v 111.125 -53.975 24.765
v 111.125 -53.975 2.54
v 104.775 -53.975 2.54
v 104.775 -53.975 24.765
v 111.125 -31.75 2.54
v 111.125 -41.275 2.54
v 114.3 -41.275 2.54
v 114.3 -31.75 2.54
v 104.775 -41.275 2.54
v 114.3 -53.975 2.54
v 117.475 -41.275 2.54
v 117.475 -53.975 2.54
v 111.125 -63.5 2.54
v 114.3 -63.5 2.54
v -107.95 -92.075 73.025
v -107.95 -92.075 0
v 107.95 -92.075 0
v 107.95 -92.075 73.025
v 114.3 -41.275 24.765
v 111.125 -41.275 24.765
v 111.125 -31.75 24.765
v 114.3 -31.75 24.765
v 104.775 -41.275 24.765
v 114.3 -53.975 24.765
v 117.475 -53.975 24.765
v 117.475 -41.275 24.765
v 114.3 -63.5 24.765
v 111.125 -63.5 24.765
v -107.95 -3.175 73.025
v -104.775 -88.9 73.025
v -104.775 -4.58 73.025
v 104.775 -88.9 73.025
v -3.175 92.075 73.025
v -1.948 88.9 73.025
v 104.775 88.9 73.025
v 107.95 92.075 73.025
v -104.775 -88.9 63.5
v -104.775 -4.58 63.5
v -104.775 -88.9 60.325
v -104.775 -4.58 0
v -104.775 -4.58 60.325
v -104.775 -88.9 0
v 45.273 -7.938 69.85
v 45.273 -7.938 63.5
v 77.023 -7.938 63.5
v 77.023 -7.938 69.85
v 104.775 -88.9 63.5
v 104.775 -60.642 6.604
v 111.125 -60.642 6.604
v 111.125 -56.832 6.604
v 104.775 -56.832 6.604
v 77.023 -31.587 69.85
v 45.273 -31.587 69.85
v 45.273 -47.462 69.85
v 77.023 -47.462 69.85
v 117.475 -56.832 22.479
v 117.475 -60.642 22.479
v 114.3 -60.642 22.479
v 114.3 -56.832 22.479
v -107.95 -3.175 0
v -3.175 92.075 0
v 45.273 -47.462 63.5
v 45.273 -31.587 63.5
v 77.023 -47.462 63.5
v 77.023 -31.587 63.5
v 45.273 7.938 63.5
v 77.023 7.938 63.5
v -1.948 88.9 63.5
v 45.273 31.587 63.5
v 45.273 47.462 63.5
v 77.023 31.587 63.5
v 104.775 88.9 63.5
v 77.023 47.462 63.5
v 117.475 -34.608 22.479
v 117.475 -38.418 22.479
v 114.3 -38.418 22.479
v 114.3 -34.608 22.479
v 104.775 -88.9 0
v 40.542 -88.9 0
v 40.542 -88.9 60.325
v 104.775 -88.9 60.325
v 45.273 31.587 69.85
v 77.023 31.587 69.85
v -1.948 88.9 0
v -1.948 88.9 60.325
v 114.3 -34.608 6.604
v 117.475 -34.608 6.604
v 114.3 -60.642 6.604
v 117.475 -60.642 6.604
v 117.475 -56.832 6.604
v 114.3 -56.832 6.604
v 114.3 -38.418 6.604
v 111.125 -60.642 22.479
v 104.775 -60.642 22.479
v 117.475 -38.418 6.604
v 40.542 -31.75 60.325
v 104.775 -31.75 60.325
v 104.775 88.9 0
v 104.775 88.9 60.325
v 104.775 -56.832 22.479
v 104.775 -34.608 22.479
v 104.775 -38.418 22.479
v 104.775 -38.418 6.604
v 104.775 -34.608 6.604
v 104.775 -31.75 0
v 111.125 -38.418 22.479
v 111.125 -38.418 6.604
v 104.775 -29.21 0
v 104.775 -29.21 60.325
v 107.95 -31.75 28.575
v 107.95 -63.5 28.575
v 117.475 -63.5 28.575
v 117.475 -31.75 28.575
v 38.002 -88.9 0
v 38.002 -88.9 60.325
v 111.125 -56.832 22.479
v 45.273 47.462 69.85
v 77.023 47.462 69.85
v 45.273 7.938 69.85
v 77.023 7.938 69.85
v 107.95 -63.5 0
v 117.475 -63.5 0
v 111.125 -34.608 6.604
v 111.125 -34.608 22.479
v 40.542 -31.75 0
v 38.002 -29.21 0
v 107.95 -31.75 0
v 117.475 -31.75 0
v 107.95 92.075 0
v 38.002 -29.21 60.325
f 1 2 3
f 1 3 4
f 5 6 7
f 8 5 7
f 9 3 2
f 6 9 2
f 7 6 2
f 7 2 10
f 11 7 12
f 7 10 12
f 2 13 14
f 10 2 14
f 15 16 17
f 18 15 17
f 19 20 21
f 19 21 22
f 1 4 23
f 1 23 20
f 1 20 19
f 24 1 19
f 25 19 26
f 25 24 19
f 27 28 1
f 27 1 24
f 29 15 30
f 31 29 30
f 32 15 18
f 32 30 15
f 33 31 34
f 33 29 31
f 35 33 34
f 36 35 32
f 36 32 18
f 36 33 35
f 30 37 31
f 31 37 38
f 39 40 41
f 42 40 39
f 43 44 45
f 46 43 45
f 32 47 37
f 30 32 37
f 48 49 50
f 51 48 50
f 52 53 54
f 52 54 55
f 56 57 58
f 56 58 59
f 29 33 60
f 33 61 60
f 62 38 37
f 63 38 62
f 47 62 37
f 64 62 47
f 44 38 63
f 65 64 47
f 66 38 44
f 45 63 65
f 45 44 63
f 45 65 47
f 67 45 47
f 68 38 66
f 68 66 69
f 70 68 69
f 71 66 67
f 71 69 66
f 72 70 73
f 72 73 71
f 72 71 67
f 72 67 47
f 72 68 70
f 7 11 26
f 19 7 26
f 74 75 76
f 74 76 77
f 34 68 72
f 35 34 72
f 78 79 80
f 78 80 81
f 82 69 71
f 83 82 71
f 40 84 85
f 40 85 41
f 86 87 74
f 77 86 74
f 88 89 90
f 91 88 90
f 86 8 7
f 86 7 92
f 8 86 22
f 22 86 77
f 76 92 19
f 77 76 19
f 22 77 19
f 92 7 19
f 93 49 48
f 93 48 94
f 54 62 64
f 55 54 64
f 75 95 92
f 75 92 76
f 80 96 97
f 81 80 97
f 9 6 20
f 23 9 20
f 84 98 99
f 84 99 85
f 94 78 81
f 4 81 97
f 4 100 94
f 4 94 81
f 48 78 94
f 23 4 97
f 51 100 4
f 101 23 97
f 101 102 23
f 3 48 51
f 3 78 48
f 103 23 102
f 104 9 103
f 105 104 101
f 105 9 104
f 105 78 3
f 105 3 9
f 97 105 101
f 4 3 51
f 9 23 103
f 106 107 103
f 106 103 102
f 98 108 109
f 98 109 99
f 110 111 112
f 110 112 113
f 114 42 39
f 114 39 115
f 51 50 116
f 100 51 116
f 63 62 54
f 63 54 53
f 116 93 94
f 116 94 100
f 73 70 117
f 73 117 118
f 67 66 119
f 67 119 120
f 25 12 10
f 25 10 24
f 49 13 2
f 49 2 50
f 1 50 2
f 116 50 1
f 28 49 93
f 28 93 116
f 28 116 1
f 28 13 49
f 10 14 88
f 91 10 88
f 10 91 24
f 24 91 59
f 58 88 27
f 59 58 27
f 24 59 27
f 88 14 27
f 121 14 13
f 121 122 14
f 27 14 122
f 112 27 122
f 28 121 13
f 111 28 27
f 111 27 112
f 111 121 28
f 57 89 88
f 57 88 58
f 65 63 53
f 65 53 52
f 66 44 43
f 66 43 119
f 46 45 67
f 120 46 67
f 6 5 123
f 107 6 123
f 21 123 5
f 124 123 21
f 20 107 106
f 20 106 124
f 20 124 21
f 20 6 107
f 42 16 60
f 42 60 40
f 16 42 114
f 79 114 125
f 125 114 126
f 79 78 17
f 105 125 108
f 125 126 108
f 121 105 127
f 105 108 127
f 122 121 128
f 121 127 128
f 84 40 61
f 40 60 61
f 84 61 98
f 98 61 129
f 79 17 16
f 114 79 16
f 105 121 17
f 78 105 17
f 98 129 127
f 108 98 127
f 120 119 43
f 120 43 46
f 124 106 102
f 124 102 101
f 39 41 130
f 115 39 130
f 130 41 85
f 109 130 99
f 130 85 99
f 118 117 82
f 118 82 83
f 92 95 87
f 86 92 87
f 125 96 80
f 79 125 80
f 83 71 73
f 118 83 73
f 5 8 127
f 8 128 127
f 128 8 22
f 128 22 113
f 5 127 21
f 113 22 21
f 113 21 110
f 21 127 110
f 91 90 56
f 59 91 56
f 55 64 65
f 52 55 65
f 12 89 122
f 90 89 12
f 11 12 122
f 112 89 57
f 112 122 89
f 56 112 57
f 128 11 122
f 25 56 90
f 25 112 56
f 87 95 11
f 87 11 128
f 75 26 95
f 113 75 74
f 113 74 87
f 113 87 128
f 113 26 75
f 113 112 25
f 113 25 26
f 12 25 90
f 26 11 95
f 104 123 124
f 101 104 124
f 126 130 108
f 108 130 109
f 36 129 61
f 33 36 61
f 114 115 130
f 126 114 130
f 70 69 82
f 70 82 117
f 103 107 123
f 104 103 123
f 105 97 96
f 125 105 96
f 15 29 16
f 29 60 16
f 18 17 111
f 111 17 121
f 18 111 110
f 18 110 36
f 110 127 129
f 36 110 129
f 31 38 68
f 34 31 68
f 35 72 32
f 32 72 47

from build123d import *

# Parameters (mm, degrees)
F1_DEPTH  = 63.5
F2_T      = -3.175
F4_DEPTH  = 9.525
F5_W      = 31.75
F5_H      = 15.875
F6_DEPTH  = 6.35
F8_DEPTH  = 60.325
F9_W      = 31.75
F9_H      = 28.575
F10_DEPTH = 9.525
F11_W     = 12.7
F11_H     = 22.225
F11_W_2   = 3.81
F11_H_2   = 15.875
F12_DEPTH = 25.654
F13_W     = 3.175
F13_H     = 22.225
F14_DEPTH = 127


with BuildPart() as f1:
    # F0 (on Top) → F1 (new body)
    with BuildSketch(Plane.XY):
        Polygon((107.95, 92.075), (-3.175, 92.075), (-107.95, -3.175), (-107.95, -92.075), (107.95, -92.075), align=None)
    extrude(amount=F1_DEPTH)

    # F2
    f2_openings = [f1.faces().sort_by_distance(p)[0] for p in [
        (10.480538, -8.657836, 0),
    ]]
    offset(amount=F2_T, openings=f2_openings)

    # F3 (on face) → F4 (join)
    with BuildSketch(Plane.XY.offset(63.5)):
        Polygon((107.95, 92.075), (-3.175, 92.075), (-107.95, -3.175), (-107.95, -92.075), (107.95, -92.075), align=None)
        Polygon((104.775, -88.9), (-104.775, -88.9), (-104.775, -4.579524), (-1.947523, 88.9), (104.775, 88.9), align=None, mode=Mode.SUBTRACT)
    extrude(amount=F4_DEPTH)

    # F5 (on face) → F6 (join)
    with BuildSketch(Plane.XY.offset(63.5)):
        with Locations((61.147683, 39.524323)):
            Rectangle(F5_W, F5_H)
        with Locations((61.147683, 0)):
            Rectangle(F5_W, F5_H)
        with Locations((61.147683, -39.524323)):
            Rectangle(F5_W, F5_H)
    extrude(amount=F6_DEPTH)

    # F7 (on face) → F8 (join, through all)
    with BuildSketch(Plane(origin=(0, 0, 60.325), x_dir=(1, 0, 0), z_dir=(0, 0, -1))):
        Polygon((104.775, 29.21), (104.775, 31.75), (40.541738, 31.75), (40.541738, 88.9), (38.001738, 88.9), (38.001738, 29.21), align=None)
    extrude(amount=F8_DEPTH)

    # F9 (on face) → F10 (join)
    with BuildSketch(Plane.YZ.offset(107.95)):
        with Locations((-47.625, 14.2875)):
            Rectangle(F9_W, F9_H)
    extrude(amount=F10_DEPTH)

    # F11 (on face) → F12 (cut)
    with BuildSketch(Plane.YZ.offset(117.475)):
        with Locations((-47.625, 13.6525)):
            Rectangle(F11_W, F11_H)
        with Locations((-58.7375, 14.5415)):
            Rectangle(F11_W_2, F11_H_2)
        with Locations((-36.5125, 14.5415)):
            Rectangle(F11_W_2, F11_H_2)
    extrude(amount=-F12_DEPTH, mode=Mode.SUBTRACT)

    # F13 (on face) → F14 (cut)
    with BuildSketch(Plane.XZ.offset(63.5)):
        with Locations((112.7125, 13.6525)):
            Rectangle(F13_W, F13_H)
    extrude(amount=-F14_DEPTH, mode=Mode.SUBTRACT)


solid = f1.part
